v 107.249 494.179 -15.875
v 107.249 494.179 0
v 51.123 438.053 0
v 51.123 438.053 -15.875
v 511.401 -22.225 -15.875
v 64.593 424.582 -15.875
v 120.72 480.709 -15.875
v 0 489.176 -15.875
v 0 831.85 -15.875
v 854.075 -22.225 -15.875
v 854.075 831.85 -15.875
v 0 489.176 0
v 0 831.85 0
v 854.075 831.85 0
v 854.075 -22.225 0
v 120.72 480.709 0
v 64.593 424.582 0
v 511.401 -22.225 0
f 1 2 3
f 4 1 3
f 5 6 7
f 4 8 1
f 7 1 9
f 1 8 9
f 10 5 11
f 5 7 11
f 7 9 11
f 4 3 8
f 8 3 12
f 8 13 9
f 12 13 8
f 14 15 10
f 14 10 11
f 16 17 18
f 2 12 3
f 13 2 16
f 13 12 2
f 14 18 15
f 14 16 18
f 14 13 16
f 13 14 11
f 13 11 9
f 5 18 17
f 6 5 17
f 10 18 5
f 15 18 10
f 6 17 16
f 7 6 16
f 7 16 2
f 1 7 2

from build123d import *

# Parameters (mm, degrees)
F1_DEPTH = 15.875
F3_DEPTH = 25.4
F5_DEPTH = 25.4


with BuildPart() as f1:
    # F0 (on Top) → F1 (new body)
    with BuildSketch(Plane.XY):
        Polygon((0, 466.725), (488.95, -22.225), (854.075, -22.225), (854.075, 831.85), (0, 831.85), align=None)
    extrude(amount=-F1_DEPTH)

    # F2 (on face) → F3 (cut)
    with BuildSketch(Plane.XY):
        Polygon((-101.9354011834, 568.6604011834), (244.475, 222.25), (590.8854011834, -124.1604011834), (602.1107213347, -112.935081032), (257.2878201513, 231.8878201513), (254.1128201513, 235.0628201513), (-90.710081032, 579.8857213347), align=None)
    extrude(amount=-F3_DEPTH, mode=Mode.SUBTRACT)

    # F4 (on face) → F5 (cut)
    with BuildSketch(Plane.XY):
        Polygon((107.249497258, 494.179344558), (51.1228965013, 438.0527438014), (64.5932806829, 424.5823596198), (120.7198814396, 480.7089603764), align=None)
    extrude(amount=-F5_DEPTH, mode=Mode.SUBTRACT)


solid = f1.part
